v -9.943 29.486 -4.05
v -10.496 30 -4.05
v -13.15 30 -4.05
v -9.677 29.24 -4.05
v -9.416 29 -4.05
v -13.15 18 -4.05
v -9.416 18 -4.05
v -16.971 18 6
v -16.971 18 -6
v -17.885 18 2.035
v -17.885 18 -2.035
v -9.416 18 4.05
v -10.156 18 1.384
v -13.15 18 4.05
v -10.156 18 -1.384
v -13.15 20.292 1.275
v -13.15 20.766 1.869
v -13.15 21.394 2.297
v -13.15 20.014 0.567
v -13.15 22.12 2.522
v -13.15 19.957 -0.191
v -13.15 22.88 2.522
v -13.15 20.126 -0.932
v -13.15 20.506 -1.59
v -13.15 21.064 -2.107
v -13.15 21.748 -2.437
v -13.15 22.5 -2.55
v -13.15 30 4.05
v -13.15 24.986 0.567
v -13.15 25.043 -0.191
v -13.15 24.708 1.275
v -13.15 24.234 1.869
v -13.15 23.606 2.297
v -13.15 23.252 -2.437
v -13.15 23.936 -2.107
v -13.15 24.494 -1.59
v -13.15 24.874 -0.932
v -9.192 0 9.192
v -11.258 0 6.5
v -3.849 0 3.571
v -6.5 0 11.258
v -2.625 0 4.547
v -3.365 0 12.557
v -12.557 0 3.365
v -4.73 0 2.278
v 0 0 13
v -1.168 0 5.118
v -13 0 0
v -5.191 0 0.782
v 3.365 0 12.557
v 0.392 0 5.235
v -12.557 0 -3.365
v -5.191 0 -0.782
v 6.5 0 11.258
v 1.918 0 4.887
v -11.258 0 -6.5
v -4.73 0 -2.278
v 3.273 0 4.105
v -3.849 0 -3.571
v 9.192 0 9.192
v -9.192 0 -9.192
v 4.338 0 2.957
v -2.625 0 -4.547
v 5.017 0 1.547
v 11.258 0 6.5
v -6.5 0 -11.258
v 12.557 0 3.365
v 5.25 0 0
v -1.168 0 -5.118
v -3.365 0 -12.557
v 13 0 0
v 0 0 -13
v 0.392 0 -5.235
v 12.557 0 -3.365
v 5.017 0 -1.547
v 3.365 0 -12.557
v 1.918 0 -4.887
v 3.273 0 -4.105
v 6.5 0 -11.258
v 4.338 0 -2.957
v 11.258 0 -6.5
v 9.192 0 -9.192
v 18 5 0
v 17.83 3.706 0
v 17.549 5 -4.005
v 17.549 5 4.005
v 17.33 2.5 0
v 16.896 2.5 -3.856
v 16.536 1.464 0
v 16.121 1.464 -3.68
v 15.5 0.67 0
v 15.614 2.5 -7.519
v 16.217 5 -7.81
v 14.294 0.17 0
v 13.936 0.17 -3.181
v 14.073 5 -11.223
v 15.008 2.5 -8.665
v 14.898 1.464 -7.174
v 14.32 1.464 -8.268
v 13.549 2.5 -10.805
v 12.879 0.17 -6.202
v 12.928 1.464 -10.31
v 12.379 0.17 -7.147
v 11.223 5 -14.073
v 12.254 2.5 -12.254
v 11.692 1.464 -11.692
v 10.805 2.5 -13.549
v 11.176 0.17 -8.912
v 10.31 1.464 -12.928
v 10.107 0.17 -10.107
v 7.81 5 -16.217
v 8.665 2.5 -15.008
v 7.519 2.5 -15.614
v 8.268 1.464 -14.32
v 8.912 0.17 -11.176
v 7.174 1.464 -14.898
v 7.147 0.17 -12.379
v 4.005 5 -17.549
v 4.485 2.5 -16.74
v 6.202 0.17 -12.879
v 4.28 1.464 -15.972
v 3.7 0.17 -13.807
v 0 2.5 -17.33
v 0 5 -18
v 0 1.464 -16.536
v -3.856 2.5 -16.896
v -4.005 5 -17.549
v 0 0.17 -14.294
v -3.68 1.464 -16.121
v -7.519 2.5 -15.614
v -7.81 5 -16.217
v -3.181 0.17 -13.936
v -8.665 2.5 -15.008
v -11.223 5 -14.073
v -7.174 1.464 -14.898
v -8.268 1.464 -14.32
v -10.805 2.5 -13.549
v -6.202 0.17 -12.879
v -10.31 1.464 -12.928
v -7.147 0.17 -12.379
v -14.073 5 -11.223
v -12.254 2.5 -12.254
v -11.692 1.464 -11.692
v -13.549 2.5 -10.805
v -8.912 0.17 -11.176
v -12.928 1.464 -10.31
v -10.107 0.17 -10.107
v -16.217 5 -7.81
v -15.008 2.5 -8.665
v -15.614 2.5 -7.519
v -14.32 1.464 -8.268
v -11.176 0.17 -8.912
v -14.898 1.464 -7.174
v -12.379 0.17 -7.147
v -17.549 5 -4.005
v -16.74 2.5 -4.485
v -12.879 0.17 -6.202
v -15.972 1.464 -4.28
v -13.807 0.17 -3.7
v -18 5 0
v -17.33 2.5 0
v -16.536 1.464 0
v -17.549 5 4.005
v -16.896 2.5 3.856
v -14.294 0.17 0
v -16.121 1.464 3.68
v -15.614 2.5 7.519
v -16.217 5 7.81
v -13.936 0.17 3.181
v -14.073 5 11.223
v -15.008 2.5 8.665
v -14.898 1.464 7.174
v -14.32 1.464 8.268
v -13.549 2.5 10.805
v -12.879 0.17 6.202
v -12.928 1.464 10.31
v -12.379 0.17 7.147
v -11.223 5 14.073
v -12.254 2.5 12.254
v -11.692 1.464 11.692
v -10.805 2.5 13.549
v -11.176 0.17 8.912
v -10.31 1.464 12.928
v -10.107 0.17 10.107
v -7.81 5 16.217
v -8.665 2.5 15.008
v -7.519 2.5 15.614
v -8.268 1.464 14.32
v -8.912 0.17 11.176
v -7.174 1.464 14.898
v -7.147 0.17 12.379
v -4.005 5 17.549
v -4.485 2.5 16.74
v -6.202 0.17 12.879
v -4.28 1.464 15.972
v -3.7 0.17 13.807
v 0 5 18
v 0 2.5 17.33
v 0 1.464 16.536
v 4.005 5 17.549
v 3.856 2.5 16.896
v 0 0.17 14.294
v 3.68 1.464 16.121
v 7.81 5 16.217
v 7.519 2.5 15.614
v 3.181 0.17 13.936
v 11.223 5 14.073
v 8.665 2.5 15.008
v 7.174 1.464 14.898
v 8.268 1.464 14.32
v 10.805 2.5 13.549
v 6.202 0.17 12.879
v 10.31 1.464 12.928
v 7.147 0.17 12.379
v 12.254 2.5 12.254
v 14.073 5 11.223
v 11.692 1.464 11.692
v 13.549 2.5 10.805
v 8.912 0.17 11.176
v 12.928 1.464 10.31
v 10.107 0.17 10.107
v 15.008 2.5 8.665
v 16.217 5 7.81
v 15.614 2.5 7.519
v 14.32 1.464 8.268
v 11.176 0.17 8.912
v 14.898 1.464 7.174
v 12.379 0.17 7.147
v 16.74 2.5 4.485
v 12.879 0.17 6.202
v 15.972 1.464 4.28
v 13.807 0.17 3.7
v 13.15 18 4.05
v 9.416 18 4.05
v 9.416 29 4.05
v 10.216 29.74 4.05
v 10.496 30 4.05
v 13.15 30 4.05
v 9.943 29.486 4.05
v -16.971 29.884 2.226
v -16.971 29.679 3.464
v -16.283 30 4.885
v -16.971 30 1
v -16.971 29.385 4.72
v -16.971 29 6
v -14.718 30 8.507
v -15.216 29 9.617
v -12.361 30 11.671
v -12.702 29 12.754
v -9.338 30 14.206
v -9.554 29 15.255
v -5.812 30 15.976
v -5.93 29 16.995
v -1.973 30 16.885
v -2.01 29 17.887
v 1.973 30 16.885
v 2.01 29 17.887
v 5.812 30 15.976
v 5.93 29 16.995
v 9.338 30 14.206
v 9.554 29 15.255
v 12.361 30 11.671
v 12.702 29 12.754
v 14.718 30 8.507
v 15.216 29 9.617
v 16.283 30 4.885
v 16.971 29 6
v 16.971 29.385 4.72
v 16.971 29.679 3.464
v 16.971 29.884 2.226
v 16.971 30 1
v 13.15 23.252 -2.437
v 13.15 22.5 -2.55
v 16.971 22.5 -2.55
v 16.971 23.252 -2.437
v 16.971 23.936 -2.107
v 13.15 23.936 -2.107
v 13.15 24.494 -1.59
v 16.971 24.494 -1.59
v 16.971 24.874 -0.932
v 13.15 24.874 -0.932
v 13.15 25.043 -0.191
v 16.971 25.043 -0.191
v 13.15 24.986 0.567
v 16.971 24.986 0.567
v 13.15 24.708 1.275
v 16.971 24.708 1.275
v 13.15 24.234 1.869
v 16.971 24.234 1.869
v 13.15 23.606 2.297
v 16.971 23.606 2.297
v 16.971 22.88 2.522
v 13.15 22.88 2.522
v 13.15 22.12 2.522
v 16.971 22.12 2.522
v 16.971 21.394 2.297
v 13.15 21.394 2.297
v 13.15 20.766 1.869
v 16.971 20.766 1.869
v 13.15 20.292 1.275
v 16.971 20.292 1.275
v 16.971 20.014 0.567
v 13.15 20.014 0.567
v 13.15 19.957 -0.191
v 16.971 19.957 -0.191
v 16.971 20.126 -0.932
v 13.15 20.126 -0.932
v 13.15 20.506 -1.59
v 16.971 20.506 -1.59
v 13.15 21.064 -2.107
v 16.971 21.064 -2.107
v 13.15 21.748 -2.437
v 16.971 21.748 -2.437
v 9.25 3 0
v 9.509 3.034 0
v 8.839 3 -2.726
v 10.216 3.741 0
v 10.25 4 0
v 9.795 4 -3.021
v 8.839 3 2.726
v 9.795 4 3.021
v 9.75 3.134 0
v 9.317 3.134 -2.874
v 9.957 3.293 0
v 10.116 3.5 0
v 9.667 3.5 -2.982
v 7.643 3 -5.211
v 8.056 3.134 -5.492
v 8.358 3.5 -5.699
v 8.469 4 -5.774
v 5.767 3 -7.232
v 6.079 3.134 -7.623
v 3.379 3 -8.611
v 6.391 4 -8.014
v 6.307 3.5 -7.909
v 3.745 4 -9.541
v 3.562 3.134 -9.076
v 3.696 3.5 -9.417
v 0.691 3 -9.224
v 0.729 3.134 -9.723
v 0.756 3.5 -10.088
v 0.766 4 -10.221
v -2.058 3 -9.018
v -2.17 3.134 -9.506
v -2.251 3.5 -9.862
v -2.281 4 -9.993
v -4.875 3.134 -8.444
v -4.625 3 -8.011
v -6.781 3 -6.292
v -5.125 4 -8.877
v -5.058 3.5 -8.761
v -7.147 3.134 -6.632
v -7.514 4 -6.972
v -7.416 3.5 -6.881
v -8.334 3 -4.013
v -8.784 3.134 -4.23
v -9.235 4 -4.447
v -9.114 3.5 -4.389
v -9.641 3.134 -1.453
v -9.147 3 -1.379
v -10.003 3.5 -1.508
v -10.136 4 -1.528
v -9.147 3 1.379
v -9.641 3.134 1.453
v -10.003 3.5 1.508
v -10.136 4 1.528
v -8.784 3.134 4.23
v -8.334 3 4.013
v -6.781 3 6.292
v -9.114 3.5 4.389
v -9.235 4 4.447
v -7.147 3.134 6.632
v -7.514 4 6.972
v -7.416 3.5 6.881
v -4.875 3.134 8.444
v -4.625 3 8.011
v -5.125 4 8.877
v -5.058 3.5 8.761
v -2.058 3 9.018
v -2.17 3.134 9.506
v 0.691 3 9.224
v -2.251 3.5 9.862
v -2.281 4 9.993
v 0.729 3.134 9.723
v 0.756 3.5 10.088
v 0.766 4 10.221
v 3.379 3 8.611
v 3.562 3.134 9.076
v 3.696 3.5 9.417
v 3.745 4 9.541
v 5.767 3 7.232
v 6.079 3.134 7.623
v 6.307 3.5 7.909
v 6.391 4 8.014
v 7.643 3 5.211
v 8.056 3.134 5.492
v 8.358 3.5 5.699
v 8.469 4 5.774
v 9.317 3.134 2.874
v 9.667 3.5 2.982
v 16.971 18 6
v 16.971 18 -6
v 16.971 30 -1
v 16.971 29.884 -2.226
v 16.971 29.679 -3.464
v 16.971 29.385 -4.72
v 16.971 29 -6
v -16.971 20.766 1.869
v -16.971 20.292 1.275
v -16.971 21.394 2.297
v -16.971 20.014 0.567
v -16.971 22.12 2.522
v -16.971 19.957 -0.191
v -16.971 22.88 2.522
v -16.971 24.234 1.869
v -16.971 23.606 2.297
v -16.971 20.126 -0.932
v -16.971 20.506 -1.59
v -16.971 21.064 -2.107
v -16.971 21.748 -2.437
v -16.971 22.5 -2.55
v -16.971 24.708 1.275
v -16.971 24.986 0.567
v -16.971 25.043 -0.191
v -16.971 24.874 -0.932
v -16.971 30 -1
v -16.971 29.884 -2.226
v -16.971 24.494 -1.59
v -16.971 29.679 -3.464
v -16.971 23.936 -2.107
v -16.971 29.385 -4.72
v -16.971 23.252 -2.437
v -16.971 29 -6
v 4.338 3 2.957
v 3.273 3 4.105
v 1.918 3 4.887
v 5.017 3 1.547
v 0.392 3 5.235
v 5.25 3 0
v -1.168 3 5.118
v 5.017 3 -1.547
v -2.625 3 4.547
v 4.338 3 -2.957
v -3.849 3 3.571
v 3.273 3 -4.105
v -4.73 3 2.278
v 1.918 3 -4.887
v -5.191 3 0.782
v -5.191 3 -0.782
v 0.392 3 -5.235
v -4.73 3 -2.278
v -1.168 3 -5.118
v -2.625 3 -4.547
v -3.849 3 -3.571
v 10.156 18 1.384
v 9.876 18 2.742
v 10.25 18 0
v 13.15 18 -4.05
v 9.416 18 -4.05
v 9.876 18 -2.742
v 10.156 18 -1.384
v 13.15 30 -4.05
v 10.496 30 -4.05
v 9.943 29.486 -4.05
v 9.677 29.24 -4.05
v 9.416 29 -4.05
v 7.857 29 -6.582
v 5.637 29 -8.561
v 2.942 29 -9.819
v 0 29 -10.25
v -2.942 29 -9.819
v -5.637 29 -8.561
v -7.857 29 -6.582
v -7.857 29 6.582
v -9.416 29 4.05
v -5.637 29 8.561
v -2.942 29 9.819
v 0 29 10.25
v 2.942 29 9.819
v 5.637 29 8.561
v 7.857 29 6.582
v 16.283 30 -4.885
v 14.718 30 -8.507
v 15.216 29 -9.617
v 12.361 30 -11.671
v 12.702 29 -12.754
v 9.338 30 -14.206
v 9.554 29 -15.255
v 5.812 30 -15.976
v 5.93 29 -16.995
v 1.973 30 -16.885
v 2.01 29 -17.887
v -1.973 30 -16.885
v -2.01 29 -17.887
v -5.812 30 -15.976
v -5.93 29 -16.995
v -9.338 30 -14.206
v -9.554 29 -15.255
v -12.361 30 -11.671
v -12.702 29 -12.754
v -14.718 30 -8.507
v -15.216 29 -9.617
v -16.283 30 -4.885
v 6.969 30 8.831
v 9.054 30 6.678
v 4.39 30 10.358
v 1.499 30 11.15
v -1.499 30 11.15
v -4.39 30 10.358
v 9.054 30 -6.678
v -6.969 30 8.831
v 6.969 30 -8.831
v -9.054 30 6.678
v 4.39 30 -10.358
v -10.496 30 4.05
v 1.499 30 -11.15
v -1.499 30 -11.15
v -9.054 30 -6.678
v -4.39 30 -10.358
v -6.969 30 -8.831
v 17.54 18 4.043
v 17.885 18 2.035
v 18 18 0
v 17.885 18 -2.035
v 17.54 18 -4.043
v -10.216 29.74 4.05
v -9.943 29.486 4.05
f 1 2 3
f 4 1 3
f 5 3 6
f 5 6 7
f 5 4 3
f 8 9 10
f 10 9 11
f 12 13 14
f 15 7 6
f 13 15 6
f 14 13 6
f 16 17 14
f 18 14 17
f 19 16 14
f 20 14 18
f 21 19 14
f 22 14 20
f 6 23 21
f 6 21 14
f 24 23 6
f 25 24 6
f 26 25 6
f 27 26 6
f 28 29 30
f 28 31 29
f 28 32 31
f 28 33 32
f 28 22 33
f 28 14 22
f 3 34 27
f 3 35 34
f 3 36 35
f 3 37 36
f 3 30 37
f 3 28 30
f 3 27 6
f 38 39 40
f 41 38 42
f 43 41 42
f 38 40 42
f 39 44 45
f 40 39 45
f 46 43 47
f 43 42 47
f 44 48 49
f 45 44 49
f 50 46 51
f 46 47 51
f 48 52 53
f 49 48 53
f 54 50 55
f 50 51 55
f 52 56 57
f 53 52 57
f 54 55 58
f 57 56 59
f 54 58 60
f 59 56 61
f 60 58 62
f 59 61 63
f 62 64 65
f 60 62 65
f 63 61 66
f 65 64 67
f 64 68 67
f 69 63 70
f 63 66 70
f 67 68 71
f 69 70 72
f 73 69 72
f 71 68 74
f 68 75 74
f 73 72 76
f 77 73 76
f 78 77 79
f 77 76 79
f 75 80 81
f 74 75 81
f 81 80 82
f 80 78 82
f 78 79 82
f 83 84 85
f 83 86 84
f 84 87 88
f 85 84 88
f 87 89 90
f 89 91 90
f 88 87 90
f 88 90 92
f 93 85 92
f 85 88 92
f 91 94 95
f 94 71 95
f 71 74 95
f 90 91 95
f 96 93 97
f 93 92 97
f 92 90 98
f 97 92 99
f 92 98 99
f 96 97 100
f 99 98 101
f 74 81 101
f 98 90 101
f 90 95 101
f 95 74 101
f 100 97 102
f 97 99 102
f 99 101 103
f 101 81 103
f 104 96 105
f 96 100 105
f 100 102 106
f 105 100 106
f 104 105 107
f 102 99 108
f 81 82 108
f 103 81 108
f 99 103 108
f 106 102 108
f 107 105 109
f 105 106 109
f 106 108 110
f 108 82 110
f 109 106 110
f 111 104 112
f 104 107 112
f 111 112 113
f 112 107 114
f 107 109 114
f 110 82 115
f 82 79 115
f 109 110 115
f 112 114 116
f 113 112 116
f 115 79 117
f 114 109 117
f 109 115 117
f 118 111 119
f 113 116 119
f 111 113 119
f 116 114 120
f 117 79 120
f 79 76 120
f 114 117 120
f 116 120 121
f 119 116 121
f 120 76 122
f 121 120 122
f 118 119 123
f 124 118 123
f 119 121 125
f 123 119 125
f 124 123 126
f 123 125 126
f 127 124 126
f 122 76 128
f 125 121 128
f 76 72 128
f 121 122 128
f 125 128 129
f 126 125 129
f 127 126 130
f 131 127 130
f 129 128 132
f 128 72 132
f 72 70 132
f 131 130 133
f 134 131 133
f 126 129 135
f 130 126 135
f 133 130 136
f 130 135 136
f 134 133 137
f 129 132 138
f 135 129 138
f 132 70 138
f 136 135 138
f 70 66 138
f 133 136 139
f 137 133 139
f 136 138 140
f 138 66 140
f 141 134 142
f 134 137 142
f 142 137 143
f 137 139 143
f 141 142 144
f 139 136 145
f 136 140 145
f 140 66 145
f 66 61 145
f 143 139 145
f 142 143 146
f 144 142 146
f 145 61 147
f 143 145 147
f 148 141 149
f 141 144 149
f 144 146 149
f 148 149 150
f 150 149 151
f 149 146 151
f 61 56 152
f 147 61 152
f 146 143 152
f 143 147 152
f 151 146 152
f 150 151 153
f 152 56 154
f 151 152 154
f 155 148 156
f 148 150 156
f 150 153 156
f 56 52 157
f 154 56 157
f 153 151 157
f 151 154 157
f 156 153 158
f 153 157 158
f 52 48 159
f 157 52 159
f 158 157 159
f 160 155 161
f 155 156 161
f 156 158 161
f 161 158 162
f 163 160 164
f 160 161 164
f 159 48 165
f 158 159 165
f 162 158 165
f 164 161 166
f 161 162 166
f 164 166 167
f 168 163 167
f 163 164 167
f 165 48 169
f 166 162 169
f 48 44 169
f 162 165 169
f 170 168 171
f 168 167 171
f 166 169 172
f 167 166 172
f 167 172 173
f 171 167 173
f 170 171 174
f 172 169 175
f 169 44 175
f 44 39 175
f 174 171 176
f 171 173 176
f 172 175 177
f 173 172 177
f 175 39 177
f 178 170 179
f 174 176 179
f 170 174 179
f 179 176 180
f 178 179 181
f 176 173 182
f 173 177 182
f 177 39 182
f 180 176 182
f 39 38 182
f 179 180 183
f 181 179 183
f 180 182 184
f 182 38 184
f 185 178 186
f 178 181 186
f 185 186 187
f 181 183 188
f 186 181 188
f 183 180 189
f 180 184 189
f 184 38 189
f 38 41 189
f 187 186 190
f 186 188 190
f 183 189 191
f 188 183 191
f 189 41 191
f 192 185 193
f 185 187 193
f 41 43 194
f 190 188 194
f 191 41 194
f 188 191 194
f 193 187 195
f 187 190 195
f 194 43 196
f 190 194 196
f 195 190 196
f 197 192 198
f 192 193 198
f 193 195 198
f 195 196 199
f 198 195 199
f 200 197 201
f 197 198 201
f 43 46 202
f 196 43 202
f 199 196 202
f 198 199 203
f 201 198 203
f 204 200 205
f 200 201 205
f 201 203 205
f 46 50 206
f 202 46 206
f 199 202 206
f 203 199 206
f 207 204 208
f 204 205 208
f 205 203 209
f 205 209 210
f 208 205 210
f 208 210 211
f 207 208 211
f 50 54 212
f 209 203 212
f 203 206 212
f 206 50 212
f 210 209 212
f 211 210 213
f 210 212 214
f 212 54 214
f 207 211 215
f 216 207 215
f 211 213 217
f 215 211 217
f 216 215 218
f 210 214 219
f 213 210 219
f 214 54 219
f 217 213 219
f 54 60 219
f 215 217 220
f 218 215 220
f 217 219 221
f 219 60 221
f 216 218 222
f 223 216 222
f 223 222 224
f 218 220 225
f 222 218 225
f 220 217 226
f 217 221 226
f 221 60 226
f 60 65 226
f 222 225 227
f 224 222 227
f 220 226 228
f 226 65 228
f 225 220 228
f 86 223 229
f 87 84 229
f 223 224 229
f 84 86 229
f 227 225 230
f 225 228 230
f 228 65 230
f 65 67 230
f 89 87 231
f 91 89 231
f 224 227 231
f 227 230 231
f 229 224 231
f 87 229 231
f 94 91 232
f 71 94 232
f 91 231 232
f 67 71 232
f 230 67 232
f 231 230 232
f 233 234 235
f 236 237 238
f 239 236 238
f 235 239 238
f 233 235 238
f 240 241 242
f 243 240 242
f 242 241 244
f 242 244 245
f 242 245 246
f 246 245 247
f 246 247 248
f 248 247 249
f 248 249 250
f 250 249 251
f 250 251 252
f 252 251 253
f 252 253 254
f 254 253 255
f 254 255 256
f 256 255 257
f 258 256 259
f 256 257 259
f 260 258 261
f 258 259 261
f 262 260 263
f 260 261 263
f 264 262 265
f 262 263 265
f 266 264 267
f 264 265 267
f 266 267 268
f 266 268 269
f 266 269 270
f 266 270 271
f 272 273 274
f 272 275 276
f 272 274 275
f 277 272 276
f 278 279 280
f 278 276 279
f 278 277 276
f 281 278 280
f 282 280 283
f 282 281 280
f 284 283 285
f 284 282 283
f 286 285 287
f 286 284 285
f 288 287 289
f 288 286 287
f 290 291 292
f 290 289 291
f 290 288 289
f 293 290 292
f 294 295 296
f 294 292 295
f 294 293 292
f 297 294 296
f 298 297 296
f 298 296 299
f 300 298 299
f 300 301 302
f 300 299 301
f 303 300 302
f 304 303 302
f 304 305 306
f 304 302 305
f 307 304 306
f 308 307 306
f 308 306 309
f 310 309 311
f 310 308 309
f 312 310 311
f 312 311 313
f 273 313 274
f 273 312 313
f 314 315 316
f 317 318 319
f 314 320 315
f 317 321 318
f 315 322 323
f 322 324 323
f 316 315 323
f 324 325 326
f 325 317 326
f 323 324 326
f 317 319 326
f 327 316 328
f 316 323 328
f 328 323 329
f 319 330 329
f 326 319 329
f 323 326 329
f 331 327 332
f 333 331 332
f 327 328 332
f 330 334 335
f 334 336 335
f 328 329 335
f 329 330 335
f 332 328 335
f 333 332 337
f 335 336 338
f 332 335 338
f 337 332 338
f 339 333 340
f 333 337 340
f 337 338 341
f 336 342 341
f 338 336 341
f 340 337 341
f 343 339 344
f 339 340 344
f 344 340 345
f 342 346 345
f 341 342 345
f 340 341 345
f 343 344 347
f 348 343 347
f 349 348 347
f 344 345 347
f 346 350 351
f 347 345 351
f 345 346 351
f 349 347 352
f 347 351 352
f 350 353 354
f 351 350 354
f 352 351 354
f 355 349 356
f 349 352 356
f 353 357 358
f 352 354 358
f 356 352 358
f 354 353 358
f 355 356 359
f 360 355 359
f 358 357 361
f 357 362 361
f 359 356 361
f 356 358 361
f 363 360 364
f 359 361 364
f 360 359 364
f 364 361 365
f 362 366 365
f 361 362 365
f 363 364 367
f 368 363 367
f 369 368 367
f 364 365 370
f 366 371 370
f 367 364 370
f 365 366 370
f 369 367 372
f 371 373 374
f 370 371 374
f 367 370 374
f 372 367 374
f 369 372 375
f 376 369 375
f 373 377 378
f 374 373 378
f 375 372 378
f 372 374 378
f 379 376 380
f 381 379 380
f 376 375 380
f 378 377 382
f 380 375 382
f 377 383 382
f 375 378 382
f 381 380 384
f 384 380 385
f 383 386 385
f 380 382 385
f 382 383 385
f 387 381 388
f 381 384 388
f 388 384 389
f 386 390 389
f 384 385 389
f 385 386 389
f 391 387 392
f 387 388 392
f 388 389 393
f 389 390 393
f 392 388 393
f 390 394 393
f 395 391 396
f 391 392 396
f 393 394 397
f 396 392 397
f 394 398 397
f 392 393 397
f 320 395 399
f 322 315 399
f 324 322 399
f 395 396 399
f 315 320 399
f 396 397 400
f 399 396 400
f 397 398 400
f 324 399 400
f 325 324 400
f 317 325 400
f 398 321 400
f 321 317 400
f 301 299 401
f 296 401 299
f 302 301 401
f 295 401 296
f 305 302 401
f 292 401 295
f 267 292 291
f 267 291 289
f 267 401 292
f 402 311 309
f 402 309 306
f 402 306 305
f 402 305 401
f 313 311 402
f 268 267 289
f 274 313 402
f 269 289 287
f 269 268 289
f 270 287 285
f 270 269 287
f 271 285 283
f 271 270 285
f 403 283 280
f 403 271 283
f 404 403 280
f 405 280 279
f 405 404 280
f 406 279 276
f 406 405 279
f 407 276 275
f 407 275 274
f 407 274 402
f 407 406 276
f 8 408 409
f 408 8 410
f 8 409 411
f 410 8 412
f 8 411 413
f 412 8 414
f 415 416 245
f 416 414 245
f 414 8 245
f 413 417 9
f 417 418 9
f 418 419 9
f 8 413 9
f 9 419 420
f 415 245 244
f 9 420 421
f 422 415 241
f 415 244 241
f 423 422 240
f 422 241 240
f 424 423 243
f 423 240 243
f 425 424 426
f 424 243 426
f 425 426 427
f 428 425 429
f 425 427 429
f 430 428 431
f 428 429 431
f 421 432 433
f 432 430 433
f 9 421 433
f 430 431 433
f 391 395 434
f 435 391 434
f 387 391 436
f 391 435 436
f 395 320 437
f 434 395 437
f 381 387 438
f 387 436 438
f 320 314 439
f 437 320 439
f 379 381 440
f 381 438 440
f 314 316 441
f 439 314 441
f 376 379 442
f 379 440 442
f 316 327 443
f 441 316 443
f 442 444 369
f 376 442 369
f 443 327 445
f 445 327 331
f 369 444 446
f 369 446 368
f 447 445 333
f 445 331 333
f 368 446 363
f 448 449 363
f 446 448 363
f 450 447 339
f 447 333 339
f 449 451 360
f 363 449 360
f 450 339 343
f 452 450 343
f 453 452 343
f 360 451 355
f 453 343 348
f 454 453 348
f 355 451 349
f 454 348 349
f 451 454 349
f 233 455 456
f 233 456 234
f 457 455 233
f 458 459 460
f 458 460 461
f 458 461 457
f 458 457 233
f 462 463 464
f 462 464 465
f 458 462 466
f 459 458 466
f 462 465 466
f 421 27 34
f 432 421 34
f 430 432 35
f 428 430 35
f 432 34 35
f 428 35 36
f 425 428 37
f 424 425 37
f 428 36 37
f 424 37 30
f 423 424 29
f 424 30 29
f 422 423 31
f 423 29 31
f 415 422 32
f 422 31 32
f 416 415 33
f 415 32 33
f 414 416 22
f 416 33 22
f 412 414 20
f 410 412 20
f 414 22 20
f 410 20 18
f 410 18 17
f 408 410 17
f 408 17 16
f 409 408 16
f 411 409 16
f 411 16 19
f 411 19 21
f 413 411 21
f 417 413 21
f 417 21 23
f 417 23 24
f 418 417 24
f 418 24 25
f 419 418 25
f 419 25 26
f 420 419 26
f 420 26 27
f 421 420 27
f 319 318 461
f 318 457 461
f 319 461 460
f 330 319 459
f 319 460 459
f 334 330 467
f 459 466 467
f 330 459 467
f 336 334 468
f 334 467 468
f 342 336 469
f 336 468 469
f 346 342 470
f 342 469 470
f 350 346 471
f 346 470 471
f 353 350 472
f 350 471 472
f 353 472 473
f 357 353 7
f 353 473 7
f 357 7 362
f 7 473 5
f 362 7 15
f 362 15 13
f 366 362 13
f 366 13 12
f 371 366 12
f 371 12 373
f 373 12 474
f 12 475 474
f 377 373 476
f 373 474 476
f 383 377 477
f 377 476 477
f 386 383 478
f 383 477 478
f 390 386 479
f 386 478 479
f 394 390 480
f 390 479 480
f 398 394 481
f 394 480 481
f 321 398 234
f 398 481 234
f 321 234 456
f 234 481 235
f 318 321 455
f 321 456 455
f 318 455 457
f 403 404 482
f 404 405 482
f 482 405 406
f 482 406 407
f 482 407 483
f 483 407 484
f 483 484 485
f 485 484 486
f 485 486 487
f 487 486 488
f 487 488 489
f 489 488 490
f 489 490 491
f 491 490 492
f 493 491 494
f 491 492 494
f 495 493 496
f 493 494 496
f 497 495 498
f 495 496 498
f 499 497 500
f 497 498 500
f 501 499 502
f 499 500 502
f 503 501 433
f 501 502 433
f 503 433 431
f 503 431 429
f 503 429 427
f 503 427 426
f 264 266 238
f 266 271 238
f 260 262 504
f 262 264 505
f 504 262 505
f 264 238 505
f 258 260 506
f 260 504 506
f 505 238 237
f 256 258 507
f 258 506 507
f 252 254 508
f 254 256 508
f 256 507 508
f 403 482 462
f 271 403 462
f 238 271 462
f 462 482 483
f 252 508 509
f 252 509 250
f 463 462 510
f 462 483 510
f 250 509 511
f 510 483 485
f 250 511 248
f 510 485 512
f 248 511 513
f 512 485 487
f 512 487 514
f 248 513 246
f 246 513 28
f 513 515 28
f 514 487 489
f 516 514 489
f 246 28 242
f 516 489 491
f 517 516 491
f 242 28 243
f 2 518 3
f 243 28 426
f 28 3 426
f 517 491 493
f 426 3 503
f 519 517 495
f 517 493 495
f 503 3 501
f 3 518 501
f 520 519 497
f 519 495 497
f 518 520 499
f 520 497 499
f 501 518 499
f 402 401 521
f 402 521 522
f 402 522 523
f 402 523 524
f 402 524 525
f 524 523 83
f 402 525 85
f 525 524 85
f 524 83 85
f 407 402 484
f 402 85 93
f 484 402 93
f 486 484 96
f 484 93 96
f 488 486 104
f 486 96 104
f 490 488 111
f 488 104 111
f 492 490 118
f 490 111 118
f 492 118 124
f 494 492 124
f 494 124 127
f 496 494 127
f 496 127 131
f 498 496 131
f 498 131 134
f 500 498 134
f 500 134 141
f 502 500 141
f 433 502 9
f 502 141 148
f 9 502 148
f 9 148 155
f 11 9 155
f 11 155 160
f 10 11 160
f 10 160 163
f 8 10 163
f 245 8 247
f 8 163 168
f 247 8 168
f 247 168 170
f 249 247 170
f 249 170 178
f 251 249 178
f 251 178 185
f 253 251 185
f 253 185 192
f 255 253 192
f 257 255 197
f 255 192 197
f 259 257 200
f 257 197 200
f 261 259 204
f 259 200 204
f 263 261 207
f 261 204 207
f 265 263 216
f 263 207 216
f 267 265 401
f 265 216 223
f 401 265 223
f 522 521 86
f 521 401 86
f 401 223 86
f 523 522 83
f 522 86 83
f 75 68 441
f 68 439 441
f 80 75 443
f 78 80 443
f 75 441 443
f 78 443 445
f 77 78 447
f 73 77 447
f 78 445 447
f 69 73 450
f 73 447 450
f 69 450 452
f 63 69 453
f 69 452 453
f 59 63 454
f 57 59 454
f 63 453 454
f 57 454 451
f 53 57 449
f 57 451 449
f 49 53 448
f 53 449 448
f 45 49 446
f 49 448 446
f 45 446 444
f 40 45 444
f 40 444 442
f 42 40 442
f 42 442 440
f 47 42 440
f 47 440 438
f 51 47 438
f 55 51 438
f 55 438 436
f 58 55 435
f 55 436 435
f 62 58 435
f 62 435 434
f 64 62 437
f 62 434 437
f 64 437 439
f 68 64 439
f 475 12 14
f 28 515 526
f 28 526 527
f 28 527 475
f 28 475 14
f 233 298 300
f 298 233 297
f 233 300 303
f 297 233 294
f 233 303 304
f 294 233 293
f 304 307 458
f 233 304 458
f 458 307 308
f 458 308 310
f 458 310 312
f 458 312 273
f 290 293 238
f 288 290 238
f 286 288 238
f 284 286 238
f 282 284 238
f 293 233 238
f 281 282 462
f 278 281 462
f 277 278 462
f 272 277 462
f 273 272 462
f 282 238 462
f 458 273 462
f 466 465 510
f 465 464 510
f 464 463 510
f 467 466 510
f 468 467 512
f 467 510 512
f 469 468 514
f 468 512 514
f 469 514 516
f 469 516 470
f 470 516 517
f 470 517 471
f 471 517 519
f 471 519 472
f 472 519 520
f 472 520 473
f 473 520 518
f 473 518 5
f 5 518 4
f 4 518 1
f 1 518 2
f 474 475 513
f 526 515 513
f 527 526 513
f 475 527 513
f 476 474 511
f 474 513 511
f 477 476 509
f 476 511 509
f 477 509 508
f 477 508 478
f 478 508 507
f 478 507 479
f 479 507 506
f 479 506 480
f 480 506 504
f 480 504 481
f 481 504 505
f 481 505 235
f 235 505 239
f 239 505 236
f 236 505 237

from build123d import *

# Parameters (mm, degrees)
FILLET1_R               = 1
CHAMFER1_SIZE           = 1
FILLET2_R               = 5
SKETCH3_W               = 2
SKETCH3_H               = 12
CUT_EXTRUDE1_DEPTH      = 12
SKETCH4_R               = 2.55
CUT_EXTRUDE2_DEPTH      = 19
CUT_EXTRUDE2_DEPTH_BACK = 19


with BuildPart() as part:
    # Sketch1 → Revolve1 (revolve)
    with BuildSketch(Plane.XY):
        Polygon((18, 0), (5.25, 0), (5.25, 3), (10.25, 3), (10.25, 30), (18, 30), align=None)
    revolve(axis=Axis((0, -427.095192794, 0), (0, 1, 0)))

    # Fillet1
    fillet1_edges = [part.edges().sort_by_distance(p)[0] for p in [
        (-10.25, 3, 0),
    ]]
    fillet(fillet1_edges, radius=FILLET1_R)

    # Chamfer1
    chamfer1_edges = [part.edges().sort_by_distance(p)[0] for p in [
        (-18, 30, 0),
        (-10.25, 30, 0),
    ]]
    chamfer(chamfer1_edges, length=CHAMFER1_SIZE)

    # Fillet2
    fillet2_edges = [part.edges().sort_by_distance(p)[0] for p in [
        (-18, 0, 0),
    ]]
    fillet(fillet2_edges, radius=FILLET2_R)

    # Sketch3 → Cut-Extrude1 (cut)
    with BuildSketch(Plane(origin=(0, 30, 0), x_dir=(1, 0, 0), z_dir=(0, 1, 0))):
        with BuildLine():
            Line((-13.15, 4.05), (-9.415943925, 4.05))
            ThreePointArc((-9.415943925, 4.05), (-10.25, 0), (-9.415943925, -4.05))
            Line((-9.415943925, -4.05), (-13.15, -4.05))
            Line((-13.15, -4.05), (-13.15, 4.05))
        make_face()
        with BuildLine():
            Line((13.15, -4.05), (13.15, 4.05))
            Line((13.15, 4.05), (9.415943925, 4.05))
            ThreePointArc((9.415943925, 4.05), (10.25, 0), (9.415943925, -4.05))
            Line((9.415943925, -4.05), (13.15, -4.05))
        make_face()
        with Locations((17.970562748, 0)):
            Rectangle(SKETCH3_W, SKETCH3_H)
        with Locations((-17.970562748, 0)):
            Rectangle(SKETCH3_W, SKETCH3_H)
    extrude(amount=-CUT_EXTRUDE1_DEPTH, mode=Mode.SUBTRACT)

    # Sketch4 → Cut-Extrude2 (cut, two sides)
    with BuildSketch(Plane(origin=(0, 0, 0), x_dir=(0, 0, -1), z_dir=(1, 0, 0))) as cut_extrude2_sk:
        with Locations((0, 22.5)):
            Circle(SKETCH4_R)
    extrude(amount=CUT_EXTRUDE2_DEPTH, mode=Mode.SUBTRACT)
    extrude(cut_extrude2_sk.sketch, amount=-CUT_EXTRUDE2_DEPTH_BACK, mode=Mode.SUBTRACT)


solid = part.part
